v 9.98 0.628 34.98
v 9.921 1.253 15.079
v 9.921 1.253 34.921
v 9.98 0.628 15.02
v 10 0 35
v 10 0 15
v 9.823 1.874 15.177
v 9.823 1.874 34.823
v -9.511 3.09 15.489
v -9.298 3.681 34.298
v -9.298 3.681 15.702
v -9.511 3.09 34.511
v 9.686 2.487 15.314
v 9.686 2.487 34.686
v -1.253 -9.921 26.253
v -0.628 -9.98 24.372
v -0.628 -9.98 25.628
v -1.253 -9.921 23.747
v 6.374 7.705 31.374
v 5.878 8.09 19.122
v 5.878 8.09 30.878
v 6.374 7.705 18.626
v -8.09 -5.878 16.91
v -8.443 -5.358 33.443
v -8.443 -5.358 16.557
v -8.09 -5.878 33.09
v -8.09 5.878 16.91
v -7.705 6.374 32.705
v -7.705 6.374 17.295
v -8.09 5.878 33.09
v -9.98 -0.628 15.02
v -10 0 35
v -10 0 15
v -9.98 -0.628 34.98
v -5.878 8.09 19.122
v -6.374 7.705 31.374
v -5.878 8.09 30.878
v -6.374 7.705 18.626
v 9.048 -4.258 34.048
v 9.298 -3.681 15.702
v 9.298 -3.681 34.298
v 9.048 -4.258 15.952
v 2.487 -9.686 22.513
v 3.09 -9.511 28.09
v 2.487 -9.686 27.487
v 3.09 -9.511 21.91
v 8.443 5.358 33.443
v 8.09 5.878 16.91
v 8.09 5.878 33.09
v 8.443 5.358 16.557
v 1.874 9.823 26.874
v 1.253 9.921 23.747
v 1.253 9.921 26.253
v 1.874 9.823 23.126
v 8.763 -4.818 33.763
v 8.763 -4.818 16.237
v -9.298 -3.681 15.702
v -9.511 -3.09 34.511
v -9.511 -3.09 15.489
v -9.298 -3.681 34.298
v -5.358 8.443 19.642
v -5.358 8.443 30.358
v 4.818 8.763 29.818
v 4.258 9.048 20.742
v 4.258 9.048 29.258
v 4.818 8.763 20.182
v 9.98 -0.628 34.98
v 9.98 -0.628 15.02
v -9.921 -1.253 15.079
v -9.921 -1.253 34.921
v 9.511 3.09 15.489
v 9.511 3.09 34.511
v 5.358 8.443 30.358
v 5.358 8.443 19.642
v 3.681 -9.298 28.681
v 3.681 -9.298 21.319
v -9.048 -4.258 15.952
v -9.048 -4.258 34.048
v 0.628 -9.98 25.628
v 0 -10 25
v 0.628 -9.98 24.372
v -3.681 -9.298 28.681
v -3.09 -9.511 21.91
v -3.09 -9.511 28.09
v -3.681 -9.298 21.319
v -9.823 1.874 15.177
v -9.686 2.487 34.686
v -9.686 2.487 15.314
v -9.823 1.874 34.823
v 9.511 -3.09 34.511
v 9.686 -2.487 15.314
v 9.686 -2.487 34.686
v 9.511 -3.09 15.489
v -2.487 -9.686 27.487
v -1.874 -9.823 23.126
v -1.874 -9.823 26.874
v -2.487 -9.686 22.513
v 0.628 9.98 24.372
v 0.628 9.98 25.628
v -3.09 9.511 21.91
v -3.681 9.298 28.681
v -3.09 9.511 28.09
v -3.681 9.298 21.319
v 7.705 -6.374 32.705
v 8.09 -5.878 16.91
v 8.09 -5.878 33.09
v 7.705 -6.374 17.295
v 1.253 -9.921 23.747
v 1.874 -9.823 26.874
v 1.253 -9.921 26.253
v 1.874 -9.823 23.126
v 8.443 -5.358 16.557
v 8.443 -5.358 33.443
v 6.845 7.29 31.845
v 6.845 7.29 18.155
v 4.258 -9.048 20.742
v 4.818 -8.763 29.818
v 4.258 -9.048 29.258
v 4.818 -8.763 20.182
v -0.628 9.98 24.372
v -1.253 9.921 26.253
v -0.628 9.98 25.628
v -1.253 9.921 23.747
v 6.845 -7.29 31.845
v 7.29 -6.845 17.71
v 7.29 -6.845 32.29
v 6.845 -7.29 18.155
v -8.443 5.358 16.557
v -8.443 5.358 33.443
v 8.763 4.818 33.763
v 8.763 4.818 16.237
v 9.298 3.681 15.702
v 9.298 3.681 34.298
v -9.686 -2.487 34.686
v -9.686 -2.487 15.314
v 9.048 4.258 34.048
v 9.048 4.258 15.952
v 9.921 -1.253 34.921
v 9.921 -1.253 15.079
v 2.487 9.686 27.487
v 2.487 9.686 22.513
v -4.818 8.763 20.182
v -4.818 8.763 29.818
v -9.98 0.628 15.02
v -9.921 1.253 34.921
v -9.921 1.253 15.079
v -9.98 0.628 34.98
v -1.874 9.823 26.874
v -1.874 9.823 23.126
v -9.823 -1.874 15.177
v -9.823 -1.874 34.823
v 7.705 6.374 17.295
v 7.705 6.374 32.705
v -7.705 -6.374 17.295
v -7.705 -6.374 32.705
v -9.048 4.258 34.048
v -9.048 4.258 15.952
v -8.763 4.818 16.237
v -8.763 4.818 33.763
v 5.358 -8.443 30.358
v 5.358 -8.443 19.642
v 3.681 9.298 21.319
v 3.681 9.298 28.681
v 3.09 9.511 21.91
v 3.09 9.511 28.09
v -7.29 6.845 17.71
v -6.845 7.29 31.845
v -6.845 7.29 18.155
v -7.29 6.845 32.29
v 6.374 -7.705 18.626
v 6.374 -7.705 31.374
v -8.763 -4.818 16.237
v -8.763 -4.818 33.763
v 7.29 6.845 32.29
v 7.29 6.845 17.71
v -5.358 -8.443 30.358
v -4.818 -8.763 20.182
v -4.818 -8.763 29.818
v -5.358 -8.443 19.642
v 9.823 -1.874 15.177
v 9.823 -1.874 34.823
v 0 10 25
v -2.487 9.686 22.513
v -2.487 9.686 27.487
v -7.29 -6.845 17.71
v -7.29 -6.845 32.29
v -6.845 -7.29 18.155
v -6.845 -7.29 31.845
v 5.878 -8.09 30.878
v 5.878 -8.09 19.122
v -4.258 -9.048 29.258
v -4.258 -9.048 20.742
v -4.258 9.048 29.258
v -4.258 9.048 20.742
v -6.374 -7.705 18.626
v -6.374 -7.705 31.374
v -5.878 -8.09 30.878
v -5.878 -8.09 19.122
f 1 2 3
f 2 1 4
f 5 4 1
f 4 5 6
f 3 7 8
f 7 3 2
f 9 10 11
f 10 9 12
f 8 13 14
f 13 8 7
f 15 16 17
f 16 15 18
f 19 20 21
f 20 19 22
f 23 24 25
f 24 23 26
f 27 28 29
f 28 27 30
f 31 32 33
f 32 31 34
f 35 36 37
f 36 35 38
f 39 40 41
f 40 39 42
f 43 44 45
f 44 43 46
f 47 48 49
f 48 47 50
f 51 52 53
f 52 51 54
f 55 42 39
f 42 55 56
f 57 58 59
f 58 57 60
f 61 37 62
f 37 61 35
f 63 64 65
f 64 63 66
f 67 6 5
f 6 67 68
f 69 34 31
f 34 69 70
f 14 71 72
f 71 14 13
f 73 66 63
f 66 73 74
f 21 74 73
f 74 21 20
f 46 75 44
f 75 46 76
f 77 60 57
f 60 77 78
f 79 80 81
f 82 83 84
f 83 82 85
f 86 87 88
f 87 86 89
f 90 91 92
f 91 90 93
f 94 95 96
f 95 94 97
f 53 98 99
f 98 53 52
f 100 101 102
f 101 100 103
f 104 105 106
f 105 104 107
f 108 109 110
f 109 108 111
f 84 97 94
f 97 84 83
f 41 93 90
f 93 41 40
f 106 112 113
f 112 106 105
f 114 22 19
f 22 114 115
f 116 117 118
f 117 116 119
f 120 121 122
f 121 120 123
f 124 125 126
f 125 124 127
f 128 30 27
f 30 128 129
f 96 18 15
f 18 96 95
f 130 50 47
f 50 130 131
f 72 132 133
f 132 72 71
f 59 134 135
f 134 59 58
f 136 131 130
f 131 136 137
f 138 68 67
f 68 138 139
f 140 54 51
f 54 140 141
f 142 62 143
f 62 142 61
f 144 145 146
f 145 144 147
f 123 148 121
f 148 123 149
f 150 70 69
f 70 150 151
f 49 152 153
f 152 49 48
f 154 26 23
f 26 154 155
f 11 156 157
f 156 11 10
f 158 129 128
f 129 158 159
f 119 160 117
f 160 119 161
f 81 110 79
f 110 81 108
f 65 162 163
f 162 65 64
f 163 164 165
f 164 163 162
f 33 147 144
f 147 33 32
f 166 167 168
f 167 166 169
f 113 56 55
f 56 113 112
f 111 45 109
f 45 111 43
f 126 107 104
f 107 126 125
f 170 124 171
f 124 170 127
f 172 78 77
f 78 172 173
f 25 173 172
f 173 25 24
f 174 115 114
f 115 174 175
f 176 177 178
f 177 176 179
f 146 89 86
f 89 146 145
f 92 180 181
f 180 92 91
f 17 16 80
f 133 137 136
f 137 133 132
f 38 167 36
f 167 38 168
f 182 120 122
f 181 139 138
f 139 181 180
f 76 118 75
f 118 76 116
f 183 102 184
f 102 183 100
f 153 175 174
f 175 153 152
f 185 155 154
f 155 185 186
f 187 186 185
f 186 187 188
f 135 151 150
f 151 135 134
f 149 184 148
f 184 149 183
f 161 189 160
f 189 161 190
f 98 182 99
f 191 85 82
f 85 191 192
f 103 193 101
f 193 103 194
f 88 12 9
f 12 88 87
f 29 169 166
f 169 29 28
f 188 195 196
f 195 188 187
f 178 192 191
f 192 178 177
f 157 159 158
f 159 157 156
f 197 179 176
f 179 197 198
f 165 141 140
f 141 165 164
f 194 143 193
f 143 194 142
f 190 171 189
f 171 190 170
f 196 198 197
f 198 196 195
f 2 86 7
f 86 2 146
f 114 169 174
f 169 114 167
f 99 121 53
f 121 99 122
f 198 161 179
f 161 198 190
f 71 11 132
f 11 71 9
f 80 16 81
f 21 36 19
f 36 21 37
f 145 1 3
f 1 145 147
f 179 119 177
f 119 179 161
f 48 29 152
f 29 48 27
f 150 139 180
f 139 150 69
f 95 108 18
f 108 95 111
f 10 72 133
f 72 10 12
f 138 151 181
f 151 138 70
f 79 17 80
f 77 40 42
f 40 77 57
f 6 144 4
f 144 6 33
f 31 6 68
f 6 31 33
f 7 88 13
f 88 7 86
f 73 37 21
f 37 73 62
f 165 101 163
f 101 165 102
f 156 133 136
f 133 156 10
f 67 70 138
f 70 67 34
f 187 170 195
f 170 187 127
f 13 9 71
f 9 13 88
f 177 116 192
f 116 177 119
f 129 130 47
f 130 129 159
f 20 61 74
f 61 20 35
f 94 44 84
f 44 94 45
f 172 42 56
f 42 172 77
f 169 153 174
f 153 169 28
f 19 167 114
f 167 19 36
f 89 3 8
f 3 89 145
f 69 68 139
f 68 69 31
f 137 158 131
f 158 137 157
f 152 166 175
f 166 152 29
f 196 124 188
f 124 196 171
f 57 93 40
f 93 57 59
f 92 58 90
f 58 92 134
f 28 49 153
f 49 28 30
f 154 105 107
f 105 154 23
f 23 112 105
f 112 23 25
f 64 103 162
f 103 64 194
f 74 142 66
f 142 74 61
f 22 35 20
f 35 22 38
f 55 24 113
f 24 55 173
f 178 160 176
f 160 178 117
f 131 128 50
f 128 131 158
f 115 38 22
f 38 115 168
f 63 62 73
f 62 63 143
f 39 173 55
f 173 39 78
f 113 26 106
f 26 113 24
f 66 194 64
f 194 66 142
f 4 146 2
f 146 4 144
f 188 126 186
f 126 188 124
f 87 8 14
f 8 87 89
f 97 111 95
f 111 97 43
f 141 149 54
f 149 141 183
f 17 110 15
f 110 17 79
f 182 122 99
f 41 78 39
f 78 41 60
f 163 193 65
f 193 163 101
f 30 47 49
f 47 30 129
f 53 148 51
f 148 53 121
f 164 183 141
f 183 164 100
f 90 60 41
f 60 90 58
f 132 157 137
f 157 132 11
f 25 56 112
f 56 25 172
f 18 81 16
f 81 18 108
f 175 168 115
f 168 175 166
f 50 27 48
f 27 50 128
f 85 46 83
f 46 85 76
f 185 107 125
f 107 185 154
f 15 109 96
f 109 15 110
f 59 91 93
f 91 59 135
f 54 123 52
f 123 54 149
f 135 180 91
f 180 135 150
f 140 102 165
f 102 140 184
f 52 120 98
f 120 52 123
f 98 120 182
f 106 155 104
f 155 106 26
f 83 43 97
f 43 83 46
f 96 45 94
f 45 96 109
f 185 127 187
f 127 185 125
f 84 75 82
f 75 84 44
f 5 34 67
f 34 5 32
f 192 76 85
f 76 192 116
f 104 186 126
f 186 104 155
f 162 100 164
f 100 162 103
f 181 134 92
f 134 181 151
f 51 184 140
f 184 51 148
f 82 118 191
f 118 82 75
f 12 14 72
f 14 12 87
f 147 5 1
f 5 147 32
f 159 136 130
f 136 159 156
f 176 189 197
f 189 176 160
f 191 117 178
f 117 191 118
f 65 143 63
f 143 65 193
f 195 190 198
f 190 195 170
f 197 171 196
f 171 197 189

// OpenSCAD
$fn=100;

intersection() {
//difference() { 
//intersection() {    
    cylinder (r=10, h=50);
    translate ([-25, 0, 25])
    rotate ([0, 90, 0])
    cylinder (r=10, h=50);
}
